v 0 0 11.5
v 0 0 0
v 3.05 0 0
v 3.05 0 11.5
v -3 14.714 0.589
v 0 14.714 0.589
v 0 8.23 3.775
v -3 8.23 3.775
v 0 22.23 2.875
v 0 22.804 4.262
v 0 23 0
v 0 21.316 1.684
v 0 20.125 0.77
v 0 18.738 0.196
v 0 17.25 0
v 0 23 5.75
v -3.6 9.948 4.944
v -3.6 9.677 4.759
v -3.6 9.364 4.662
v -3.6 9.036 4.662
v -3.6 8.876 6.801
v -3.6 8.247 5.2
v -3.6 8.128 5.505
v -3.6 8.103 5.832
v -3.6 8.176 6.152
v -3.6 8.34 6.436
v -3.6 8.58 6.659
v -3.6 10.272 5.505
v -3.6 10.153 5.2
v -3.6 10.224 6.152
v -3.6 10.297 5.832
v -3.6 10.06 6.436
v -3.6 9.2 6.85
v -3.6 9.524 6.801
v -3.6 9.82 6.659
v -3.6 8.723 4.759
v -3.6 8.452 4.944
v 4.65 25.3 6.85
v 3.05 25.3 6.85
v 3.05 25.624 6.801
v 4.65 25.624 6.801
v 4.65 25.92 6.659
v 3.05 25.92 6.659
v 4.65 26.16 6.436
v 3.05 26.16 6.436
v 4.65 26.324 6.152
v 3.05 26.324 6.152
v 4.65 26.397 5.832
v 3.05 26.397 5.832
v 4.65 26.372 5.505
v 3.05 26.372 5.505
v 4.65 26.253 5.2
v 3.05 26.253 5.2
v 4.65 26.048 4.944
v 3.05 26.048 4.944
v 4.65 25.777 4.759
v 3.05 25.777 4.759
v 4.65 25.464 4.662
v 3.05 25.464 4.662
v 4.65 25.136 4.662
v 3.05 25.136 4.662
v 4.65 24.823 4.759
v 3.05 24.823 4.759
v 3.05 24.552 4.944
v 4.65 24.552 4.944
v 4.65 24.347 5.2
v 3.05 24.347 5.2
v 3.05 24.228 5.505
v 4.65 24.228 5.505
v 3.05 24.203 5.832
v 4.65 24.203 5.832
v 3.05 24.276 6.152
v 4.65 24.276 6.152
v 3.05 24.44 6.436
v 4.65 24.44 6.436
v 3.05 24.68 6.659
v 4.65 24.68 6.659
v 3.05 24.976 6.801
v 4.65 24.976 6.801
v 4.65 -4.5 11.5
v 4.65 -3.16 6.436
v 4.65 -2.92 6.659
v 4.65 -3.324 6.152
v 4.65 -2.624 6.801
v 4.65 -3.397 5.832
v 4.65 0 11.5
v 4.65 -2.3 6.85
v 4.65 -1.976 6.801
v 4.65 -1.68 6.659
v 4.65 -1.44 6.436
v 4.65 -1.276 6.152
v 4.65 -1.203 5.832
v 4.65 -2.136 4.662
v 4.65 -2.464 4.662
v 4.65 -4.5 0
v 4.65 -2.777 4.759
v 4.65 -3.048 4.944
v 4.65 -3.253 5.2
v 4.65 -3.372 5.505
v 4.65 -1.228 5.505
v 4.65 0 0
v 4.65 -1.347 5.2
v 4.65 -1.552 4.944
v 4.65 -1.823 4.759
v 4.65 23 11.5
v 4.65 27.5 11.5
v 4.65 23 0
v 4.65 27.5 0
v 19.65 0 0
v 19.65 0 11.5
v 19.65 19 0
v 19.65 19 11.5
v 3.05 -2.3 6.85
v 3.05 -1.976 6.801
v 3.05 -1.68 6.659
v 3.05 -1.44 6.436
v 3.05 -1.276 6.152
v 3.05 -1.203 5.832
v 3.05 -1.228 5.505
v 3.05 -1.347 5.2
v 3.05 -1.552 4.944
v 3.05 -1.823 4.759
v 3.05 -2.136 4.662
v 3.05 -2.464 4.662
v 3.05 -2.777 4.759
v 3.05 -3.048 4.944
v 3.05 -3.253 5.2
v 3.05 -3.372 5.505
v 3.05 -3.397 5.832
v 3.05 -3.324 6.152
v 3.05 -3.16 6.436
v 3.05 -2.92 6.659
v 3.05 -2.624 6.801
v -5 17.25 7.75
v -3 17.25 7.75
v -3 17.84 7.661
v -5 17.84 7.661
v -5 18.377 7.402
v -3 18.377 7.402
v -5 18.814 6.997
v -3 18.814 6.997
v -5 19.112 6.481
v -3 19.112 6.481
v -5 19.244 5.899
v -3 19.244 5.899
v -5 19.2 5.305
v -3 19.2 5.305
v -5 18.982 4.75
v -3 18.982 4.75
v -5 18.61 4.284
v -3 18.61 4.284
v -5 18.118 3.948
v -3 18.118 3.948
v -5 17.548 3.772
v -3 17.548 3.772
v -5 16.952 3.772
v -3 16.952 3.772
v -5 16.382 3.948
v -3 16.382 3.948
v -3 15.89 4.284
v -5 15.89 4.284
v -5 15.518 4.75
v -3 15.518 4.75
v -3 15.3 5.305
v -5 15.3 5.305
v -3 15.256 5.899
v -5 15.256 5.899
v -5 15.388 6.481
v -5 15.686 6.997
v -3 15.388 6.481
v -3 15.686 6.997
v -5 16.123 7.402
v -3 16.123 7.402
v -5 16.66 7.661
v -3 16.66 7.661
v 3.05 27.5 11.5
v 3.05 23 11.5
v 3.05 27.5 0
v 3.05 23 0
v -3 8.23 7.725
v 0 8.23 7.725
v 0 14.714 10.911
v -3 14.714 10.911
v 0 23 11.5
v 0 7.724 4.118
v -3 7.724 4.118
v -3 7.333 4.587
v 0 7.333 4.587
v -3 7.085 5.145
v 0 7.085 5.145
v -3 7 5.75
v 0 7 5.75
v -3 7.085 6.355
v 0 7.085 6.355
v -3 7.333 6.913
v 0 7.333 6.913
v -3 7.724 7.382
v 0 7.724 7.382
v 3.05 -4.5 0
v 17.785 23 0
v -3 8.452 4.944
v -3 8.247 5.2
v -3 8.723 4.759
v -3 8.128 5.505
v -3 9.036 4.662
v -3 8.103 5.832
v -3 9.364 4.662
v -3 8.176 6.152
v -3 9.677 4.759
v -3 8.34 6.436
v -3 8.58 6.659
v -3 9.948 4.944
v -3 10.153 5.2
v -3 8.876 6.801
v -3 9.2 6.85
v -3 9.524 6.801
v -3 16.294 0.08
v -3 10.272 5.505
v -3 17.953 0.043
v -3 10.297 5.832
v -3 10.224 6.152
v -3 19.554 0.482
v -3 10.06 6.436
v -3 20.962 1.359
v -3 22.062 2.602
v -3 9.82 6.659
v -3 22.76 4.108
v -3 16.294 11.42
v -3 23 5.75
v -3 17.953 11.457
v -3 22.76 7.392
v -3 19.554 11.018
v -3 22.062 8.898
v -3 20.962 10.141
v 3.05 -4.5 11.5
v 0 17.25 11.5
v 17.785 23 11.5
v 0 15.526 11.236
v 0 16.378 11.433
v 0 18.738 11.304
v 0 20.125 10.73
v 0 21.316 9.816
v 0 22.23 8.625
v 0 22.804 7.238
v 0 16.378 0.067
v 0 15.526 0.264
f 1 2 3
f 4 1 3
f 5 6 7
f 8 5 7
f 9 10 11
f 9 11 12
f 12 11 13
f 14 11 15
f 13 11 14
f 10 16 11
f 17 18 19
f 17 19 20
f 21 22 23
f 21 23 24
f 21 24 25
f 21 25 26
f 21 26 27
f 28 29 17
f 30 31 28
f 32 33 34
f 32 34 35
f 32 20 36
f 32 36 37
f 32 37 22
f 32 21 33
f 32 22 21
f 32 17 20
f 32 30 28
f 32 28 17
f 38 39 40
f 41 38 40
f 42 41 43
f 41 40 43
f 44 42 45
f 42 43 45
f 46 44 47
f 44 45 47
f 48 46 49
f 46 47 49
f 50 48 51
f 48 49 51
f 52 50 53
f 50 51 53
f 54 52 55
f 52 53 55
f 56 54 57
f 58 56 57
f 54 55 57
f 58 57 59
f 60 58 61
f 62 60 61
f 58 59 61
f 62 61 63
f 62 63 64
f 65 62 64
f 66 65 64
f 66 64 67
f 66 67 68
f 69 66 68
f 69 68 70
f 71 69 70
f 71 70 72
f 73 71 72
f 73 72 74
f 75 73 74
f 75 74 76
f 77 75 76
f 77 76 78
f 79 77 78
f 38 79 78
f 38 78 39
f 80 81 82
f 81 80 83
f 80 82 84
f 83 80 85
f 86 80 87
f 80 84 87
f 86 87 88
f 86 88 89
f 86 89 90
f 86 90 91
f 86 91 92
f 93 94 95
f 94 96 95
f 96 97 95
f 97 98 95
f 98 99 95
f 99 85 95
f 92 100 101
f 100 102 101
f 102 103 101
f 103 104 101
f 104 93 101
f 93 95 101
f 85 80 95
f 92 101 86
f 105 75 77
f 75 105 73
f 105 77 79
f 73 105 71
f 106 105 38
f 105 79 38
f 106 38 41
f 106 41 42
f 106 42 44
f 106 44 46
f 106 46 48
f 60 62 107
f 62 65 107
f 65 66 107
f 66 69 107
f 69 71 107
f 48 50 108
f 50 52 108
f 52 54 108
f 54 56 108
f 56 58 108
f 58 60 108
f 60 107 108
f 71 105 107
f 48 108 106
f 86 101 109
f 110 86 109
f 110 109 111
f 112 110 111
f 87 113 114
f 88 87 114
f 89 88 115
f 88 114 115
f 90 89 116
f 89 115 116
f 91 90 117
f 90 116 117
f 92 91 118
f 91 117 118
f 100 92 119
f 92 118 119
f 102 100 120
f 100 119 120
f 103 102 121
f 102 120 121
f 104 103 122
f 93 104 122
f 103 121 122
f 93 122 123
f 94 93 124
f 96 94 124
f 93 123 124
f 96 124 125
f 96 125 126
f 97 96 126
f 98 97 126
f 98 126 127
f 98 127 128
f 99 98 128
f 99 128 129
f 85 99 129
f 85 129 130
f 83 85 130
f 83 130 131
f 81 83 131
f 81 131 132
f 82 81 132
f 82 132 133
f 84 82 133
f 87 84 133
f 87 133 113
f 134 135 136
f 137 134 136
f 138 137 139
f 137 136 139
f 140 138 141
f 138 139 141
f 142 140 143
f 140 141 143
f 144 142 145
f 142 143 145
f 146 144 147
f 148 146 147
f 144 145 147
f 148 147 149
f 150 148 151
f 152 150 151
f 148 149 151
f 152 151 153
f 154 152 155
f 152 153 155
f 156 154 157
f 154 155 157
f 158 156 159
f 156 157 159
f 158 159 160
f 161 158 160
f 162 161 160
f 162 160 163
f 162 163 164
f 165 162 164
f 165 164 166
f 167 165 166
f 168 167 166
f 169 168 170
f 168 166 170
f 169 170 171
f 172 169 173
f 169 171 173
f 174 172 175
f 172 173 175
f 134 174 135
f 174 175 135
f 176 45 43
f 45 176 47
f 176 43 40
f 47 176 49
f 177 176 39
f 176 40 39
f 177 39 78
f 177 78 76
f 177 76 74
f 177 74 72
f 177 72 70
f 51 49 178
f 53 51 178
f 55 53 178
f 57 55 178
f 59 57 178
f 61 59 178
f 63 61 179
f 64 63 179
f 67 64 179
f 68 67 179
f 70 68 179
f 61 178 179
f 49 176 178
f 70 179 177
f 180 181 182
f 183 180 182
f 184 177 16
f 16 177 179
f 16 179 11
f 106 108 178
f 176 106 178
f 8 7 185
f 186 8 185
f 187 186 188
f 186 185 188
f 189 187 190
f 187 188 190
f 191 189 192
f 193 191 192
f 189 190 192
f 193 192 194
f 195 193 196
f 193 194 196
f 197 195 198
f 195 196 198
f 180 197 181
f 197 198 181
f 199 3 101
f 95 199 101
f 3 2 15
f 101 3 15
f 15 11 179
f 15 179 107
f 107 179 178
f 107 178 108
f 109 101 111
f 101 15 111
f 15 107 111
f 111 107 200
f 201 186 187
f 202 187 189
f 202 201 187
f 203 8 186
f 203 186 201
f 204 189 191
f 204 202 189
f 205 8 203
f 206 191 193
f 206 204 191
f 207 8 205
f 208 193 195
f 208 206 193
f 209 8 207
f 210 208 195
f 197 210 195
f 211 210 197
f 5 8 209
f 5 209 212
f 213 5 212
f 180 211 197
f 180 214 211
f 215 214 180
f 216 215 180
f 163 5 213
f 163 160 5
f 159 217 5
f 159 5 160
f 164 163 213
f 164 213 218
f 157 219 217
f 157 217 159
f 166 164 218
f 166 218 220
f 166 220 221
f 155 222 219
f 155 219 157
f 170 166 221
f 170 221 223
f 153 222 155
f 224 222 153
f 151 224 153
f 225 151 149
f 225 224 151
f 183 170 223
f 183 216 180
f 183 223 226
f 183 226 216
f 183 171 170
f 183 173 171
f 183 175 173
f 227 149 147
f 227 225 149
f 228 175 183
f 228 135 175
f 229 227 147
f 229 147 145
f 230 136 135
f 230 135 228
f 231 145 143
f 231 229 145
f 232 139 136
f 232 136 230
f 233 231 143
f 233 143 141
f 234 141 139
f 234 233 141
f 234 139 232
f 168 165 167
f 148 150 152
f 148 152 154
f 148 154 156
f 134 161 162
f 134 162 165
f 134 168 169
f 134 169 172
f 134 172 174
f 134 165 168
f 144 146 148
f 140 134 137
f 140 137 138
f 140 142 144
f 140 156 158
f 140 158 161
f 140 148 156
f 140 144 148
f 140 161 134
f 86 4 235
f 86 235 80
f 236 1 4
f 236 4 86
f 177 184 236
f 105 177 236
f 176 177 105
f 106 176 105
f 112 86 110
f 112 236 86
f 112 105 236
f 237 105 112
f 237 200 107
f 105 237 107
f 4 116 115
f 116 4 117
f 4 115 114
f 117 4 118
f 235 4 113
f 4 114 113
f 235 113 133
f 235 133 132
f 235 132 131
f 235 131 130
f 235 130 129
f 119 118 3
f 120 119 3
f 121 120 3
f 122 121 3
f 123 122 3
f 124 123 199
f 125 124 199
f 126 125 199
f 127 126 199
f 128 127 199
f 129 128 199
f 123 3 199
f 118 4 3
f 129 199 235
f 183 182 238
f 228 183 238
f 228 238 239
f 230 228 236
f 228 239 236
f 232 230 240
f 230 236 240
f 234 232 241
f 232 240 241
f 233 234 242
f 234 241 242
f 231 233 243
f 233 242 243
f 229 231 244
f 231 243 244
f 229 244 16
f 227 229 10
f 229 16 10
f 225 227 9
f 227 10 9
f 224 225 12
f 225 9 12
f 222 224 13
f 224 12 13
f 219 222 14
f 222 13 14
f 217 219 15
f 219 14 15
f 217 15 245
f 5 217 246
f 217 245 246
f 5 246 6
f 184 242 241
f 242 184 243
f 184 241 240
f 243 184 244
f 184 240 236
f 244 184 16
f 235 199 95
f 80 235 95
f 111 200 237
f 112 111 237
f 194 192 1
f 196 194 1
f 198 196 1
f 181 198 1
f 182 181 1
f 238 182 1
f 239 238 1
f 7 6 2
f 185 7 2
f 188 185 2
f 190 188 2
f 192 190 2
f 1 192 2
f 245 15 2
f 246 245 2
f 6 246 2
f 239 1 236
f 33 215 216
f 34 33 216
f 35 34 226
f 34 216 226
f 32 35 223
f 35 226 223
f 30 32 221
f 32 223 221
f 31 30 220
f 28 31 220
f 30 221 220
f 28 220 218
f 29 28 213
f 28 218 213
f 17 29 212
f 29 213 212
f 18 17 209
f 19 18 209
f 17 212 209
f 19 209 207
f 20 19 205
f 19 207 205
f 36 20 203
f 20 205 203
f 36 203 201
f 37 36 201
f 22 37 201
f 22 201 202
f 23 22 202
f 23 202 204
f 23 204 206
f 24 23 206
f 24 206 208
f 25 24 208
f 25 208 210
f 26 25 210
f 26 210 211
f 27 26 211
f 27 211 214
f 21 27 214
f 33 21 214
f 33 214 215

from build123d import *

# Parameters (mm, degrees)
EXTRUDE_1_DEPTH     = 11.5
SKETCH_3_R          = 1.1
CUT_EXTRUDE_1_DEPTH = 17.6
SKETCH_6_R          = 1.1
CUT_EXTRUDE_2_DEPTH = 17.6
EXTRUDE_2_DEPTH     = 3
SKETCH_8_R          = 1.1
EXTRUDE_3_DEPTH     = 3.6
SKETCH_11_R         = 2
EXTRUDE_4_DEPTH     = 2
CHAMFER_1_SIZE      = 4
CHAMFER_1_SIZE2     = 1.865230633


with BuildPart() as part:
    # 草图1 → 凸台-拉伸1 (new body)
    with BuildSketch(Plane.XY):
        Polygon((4.65, 23), (4.65, 27.5), (3.05, 27.5), (3.05, 23), (0, 23), (0, 0), (3.05, 0), (3.05, -4.5), (4.65, -4.5), (4.65, 0), (19.65, 0), (19.65, 23), align=None)
    extrude(amount=EXTRUDE_1_DEPTH)

    # 草图3 → 切除-拉伸1 (cut, through all)
    with BuildSketch(Plane.ZY.offset(-3.05)):
        with Locations((5.75, 25.3)):
            Circle(SKETCH_3_R)
    extrude(amount=-CUT_EXTRUDE_1_DEPTH, mode=Mode.SUBTRACT)

    # 草图6 → 切除-拉伸2 (cut, through all)
    with BuildSketch(Plane.ZY.offset(-3.05)):
        with Locations((5.75, -2.3)):
            Circle(SKETCH_6_R)
    extrude(amount=-CUT_EXTRUDE_2_DEPTH, mode=Mode.SUBTRACT)

    # 草图10 → 凸台-拉伸2 (add)
    with BuildSketch(Plane.ZY):
        with BuildLine():
            Line((0.589316609, 14.714285714), (3.775477659, 8.229813665))
            ThreePointArc((3.775477659, 8.229813665), (5.75, 7), (7.724522341, 8.229813665))
            Line((7.724522341, 8.229813665), (10.910683391, 14.714285714))
            ThreePointArc((10.910683391, 14.714285714), (5.75, 23), (0.589316609, 14.714285714))
        make_face()
    extrude(amount=EXTRUDE_2_DEPTH)

    # 草图8 → 凸台-拉伸3 (add)
    with BuildSketch(Plane.ZY):
        with Locations((5.75, 9.2)):
            Circle(SKETCH_8_R)
    extrude(amount=EXTRUDE_3_DEPTH)

    # 草图11 → 凸台-拉伸4 (add)
    with BuildSketch(Plane.ZY.offset(3)):
        with Locations((5.75, 17.25)):
            Circle(SKETCH_11_R)
    extrude(amount=EXTRUDE_4_DEPTH)

    # 倒角1
    chamfer_1_edges = [part.edges().sort_by_distance(p)[0] for p in [
        (19.65, 23, 5.75),
    ]]
    chamfer_1_side = [part.faces().sort_by_distance(p)[0] for p in [
        (19.65, 11.5, 5.75),
    ]]
    chamfer(chamfer_1_edges, length=CHAMFER_1_SIZE, length2=CHAMFER_1_SIZE2, reference=chamfer_1_side[0])


solid = part.part
